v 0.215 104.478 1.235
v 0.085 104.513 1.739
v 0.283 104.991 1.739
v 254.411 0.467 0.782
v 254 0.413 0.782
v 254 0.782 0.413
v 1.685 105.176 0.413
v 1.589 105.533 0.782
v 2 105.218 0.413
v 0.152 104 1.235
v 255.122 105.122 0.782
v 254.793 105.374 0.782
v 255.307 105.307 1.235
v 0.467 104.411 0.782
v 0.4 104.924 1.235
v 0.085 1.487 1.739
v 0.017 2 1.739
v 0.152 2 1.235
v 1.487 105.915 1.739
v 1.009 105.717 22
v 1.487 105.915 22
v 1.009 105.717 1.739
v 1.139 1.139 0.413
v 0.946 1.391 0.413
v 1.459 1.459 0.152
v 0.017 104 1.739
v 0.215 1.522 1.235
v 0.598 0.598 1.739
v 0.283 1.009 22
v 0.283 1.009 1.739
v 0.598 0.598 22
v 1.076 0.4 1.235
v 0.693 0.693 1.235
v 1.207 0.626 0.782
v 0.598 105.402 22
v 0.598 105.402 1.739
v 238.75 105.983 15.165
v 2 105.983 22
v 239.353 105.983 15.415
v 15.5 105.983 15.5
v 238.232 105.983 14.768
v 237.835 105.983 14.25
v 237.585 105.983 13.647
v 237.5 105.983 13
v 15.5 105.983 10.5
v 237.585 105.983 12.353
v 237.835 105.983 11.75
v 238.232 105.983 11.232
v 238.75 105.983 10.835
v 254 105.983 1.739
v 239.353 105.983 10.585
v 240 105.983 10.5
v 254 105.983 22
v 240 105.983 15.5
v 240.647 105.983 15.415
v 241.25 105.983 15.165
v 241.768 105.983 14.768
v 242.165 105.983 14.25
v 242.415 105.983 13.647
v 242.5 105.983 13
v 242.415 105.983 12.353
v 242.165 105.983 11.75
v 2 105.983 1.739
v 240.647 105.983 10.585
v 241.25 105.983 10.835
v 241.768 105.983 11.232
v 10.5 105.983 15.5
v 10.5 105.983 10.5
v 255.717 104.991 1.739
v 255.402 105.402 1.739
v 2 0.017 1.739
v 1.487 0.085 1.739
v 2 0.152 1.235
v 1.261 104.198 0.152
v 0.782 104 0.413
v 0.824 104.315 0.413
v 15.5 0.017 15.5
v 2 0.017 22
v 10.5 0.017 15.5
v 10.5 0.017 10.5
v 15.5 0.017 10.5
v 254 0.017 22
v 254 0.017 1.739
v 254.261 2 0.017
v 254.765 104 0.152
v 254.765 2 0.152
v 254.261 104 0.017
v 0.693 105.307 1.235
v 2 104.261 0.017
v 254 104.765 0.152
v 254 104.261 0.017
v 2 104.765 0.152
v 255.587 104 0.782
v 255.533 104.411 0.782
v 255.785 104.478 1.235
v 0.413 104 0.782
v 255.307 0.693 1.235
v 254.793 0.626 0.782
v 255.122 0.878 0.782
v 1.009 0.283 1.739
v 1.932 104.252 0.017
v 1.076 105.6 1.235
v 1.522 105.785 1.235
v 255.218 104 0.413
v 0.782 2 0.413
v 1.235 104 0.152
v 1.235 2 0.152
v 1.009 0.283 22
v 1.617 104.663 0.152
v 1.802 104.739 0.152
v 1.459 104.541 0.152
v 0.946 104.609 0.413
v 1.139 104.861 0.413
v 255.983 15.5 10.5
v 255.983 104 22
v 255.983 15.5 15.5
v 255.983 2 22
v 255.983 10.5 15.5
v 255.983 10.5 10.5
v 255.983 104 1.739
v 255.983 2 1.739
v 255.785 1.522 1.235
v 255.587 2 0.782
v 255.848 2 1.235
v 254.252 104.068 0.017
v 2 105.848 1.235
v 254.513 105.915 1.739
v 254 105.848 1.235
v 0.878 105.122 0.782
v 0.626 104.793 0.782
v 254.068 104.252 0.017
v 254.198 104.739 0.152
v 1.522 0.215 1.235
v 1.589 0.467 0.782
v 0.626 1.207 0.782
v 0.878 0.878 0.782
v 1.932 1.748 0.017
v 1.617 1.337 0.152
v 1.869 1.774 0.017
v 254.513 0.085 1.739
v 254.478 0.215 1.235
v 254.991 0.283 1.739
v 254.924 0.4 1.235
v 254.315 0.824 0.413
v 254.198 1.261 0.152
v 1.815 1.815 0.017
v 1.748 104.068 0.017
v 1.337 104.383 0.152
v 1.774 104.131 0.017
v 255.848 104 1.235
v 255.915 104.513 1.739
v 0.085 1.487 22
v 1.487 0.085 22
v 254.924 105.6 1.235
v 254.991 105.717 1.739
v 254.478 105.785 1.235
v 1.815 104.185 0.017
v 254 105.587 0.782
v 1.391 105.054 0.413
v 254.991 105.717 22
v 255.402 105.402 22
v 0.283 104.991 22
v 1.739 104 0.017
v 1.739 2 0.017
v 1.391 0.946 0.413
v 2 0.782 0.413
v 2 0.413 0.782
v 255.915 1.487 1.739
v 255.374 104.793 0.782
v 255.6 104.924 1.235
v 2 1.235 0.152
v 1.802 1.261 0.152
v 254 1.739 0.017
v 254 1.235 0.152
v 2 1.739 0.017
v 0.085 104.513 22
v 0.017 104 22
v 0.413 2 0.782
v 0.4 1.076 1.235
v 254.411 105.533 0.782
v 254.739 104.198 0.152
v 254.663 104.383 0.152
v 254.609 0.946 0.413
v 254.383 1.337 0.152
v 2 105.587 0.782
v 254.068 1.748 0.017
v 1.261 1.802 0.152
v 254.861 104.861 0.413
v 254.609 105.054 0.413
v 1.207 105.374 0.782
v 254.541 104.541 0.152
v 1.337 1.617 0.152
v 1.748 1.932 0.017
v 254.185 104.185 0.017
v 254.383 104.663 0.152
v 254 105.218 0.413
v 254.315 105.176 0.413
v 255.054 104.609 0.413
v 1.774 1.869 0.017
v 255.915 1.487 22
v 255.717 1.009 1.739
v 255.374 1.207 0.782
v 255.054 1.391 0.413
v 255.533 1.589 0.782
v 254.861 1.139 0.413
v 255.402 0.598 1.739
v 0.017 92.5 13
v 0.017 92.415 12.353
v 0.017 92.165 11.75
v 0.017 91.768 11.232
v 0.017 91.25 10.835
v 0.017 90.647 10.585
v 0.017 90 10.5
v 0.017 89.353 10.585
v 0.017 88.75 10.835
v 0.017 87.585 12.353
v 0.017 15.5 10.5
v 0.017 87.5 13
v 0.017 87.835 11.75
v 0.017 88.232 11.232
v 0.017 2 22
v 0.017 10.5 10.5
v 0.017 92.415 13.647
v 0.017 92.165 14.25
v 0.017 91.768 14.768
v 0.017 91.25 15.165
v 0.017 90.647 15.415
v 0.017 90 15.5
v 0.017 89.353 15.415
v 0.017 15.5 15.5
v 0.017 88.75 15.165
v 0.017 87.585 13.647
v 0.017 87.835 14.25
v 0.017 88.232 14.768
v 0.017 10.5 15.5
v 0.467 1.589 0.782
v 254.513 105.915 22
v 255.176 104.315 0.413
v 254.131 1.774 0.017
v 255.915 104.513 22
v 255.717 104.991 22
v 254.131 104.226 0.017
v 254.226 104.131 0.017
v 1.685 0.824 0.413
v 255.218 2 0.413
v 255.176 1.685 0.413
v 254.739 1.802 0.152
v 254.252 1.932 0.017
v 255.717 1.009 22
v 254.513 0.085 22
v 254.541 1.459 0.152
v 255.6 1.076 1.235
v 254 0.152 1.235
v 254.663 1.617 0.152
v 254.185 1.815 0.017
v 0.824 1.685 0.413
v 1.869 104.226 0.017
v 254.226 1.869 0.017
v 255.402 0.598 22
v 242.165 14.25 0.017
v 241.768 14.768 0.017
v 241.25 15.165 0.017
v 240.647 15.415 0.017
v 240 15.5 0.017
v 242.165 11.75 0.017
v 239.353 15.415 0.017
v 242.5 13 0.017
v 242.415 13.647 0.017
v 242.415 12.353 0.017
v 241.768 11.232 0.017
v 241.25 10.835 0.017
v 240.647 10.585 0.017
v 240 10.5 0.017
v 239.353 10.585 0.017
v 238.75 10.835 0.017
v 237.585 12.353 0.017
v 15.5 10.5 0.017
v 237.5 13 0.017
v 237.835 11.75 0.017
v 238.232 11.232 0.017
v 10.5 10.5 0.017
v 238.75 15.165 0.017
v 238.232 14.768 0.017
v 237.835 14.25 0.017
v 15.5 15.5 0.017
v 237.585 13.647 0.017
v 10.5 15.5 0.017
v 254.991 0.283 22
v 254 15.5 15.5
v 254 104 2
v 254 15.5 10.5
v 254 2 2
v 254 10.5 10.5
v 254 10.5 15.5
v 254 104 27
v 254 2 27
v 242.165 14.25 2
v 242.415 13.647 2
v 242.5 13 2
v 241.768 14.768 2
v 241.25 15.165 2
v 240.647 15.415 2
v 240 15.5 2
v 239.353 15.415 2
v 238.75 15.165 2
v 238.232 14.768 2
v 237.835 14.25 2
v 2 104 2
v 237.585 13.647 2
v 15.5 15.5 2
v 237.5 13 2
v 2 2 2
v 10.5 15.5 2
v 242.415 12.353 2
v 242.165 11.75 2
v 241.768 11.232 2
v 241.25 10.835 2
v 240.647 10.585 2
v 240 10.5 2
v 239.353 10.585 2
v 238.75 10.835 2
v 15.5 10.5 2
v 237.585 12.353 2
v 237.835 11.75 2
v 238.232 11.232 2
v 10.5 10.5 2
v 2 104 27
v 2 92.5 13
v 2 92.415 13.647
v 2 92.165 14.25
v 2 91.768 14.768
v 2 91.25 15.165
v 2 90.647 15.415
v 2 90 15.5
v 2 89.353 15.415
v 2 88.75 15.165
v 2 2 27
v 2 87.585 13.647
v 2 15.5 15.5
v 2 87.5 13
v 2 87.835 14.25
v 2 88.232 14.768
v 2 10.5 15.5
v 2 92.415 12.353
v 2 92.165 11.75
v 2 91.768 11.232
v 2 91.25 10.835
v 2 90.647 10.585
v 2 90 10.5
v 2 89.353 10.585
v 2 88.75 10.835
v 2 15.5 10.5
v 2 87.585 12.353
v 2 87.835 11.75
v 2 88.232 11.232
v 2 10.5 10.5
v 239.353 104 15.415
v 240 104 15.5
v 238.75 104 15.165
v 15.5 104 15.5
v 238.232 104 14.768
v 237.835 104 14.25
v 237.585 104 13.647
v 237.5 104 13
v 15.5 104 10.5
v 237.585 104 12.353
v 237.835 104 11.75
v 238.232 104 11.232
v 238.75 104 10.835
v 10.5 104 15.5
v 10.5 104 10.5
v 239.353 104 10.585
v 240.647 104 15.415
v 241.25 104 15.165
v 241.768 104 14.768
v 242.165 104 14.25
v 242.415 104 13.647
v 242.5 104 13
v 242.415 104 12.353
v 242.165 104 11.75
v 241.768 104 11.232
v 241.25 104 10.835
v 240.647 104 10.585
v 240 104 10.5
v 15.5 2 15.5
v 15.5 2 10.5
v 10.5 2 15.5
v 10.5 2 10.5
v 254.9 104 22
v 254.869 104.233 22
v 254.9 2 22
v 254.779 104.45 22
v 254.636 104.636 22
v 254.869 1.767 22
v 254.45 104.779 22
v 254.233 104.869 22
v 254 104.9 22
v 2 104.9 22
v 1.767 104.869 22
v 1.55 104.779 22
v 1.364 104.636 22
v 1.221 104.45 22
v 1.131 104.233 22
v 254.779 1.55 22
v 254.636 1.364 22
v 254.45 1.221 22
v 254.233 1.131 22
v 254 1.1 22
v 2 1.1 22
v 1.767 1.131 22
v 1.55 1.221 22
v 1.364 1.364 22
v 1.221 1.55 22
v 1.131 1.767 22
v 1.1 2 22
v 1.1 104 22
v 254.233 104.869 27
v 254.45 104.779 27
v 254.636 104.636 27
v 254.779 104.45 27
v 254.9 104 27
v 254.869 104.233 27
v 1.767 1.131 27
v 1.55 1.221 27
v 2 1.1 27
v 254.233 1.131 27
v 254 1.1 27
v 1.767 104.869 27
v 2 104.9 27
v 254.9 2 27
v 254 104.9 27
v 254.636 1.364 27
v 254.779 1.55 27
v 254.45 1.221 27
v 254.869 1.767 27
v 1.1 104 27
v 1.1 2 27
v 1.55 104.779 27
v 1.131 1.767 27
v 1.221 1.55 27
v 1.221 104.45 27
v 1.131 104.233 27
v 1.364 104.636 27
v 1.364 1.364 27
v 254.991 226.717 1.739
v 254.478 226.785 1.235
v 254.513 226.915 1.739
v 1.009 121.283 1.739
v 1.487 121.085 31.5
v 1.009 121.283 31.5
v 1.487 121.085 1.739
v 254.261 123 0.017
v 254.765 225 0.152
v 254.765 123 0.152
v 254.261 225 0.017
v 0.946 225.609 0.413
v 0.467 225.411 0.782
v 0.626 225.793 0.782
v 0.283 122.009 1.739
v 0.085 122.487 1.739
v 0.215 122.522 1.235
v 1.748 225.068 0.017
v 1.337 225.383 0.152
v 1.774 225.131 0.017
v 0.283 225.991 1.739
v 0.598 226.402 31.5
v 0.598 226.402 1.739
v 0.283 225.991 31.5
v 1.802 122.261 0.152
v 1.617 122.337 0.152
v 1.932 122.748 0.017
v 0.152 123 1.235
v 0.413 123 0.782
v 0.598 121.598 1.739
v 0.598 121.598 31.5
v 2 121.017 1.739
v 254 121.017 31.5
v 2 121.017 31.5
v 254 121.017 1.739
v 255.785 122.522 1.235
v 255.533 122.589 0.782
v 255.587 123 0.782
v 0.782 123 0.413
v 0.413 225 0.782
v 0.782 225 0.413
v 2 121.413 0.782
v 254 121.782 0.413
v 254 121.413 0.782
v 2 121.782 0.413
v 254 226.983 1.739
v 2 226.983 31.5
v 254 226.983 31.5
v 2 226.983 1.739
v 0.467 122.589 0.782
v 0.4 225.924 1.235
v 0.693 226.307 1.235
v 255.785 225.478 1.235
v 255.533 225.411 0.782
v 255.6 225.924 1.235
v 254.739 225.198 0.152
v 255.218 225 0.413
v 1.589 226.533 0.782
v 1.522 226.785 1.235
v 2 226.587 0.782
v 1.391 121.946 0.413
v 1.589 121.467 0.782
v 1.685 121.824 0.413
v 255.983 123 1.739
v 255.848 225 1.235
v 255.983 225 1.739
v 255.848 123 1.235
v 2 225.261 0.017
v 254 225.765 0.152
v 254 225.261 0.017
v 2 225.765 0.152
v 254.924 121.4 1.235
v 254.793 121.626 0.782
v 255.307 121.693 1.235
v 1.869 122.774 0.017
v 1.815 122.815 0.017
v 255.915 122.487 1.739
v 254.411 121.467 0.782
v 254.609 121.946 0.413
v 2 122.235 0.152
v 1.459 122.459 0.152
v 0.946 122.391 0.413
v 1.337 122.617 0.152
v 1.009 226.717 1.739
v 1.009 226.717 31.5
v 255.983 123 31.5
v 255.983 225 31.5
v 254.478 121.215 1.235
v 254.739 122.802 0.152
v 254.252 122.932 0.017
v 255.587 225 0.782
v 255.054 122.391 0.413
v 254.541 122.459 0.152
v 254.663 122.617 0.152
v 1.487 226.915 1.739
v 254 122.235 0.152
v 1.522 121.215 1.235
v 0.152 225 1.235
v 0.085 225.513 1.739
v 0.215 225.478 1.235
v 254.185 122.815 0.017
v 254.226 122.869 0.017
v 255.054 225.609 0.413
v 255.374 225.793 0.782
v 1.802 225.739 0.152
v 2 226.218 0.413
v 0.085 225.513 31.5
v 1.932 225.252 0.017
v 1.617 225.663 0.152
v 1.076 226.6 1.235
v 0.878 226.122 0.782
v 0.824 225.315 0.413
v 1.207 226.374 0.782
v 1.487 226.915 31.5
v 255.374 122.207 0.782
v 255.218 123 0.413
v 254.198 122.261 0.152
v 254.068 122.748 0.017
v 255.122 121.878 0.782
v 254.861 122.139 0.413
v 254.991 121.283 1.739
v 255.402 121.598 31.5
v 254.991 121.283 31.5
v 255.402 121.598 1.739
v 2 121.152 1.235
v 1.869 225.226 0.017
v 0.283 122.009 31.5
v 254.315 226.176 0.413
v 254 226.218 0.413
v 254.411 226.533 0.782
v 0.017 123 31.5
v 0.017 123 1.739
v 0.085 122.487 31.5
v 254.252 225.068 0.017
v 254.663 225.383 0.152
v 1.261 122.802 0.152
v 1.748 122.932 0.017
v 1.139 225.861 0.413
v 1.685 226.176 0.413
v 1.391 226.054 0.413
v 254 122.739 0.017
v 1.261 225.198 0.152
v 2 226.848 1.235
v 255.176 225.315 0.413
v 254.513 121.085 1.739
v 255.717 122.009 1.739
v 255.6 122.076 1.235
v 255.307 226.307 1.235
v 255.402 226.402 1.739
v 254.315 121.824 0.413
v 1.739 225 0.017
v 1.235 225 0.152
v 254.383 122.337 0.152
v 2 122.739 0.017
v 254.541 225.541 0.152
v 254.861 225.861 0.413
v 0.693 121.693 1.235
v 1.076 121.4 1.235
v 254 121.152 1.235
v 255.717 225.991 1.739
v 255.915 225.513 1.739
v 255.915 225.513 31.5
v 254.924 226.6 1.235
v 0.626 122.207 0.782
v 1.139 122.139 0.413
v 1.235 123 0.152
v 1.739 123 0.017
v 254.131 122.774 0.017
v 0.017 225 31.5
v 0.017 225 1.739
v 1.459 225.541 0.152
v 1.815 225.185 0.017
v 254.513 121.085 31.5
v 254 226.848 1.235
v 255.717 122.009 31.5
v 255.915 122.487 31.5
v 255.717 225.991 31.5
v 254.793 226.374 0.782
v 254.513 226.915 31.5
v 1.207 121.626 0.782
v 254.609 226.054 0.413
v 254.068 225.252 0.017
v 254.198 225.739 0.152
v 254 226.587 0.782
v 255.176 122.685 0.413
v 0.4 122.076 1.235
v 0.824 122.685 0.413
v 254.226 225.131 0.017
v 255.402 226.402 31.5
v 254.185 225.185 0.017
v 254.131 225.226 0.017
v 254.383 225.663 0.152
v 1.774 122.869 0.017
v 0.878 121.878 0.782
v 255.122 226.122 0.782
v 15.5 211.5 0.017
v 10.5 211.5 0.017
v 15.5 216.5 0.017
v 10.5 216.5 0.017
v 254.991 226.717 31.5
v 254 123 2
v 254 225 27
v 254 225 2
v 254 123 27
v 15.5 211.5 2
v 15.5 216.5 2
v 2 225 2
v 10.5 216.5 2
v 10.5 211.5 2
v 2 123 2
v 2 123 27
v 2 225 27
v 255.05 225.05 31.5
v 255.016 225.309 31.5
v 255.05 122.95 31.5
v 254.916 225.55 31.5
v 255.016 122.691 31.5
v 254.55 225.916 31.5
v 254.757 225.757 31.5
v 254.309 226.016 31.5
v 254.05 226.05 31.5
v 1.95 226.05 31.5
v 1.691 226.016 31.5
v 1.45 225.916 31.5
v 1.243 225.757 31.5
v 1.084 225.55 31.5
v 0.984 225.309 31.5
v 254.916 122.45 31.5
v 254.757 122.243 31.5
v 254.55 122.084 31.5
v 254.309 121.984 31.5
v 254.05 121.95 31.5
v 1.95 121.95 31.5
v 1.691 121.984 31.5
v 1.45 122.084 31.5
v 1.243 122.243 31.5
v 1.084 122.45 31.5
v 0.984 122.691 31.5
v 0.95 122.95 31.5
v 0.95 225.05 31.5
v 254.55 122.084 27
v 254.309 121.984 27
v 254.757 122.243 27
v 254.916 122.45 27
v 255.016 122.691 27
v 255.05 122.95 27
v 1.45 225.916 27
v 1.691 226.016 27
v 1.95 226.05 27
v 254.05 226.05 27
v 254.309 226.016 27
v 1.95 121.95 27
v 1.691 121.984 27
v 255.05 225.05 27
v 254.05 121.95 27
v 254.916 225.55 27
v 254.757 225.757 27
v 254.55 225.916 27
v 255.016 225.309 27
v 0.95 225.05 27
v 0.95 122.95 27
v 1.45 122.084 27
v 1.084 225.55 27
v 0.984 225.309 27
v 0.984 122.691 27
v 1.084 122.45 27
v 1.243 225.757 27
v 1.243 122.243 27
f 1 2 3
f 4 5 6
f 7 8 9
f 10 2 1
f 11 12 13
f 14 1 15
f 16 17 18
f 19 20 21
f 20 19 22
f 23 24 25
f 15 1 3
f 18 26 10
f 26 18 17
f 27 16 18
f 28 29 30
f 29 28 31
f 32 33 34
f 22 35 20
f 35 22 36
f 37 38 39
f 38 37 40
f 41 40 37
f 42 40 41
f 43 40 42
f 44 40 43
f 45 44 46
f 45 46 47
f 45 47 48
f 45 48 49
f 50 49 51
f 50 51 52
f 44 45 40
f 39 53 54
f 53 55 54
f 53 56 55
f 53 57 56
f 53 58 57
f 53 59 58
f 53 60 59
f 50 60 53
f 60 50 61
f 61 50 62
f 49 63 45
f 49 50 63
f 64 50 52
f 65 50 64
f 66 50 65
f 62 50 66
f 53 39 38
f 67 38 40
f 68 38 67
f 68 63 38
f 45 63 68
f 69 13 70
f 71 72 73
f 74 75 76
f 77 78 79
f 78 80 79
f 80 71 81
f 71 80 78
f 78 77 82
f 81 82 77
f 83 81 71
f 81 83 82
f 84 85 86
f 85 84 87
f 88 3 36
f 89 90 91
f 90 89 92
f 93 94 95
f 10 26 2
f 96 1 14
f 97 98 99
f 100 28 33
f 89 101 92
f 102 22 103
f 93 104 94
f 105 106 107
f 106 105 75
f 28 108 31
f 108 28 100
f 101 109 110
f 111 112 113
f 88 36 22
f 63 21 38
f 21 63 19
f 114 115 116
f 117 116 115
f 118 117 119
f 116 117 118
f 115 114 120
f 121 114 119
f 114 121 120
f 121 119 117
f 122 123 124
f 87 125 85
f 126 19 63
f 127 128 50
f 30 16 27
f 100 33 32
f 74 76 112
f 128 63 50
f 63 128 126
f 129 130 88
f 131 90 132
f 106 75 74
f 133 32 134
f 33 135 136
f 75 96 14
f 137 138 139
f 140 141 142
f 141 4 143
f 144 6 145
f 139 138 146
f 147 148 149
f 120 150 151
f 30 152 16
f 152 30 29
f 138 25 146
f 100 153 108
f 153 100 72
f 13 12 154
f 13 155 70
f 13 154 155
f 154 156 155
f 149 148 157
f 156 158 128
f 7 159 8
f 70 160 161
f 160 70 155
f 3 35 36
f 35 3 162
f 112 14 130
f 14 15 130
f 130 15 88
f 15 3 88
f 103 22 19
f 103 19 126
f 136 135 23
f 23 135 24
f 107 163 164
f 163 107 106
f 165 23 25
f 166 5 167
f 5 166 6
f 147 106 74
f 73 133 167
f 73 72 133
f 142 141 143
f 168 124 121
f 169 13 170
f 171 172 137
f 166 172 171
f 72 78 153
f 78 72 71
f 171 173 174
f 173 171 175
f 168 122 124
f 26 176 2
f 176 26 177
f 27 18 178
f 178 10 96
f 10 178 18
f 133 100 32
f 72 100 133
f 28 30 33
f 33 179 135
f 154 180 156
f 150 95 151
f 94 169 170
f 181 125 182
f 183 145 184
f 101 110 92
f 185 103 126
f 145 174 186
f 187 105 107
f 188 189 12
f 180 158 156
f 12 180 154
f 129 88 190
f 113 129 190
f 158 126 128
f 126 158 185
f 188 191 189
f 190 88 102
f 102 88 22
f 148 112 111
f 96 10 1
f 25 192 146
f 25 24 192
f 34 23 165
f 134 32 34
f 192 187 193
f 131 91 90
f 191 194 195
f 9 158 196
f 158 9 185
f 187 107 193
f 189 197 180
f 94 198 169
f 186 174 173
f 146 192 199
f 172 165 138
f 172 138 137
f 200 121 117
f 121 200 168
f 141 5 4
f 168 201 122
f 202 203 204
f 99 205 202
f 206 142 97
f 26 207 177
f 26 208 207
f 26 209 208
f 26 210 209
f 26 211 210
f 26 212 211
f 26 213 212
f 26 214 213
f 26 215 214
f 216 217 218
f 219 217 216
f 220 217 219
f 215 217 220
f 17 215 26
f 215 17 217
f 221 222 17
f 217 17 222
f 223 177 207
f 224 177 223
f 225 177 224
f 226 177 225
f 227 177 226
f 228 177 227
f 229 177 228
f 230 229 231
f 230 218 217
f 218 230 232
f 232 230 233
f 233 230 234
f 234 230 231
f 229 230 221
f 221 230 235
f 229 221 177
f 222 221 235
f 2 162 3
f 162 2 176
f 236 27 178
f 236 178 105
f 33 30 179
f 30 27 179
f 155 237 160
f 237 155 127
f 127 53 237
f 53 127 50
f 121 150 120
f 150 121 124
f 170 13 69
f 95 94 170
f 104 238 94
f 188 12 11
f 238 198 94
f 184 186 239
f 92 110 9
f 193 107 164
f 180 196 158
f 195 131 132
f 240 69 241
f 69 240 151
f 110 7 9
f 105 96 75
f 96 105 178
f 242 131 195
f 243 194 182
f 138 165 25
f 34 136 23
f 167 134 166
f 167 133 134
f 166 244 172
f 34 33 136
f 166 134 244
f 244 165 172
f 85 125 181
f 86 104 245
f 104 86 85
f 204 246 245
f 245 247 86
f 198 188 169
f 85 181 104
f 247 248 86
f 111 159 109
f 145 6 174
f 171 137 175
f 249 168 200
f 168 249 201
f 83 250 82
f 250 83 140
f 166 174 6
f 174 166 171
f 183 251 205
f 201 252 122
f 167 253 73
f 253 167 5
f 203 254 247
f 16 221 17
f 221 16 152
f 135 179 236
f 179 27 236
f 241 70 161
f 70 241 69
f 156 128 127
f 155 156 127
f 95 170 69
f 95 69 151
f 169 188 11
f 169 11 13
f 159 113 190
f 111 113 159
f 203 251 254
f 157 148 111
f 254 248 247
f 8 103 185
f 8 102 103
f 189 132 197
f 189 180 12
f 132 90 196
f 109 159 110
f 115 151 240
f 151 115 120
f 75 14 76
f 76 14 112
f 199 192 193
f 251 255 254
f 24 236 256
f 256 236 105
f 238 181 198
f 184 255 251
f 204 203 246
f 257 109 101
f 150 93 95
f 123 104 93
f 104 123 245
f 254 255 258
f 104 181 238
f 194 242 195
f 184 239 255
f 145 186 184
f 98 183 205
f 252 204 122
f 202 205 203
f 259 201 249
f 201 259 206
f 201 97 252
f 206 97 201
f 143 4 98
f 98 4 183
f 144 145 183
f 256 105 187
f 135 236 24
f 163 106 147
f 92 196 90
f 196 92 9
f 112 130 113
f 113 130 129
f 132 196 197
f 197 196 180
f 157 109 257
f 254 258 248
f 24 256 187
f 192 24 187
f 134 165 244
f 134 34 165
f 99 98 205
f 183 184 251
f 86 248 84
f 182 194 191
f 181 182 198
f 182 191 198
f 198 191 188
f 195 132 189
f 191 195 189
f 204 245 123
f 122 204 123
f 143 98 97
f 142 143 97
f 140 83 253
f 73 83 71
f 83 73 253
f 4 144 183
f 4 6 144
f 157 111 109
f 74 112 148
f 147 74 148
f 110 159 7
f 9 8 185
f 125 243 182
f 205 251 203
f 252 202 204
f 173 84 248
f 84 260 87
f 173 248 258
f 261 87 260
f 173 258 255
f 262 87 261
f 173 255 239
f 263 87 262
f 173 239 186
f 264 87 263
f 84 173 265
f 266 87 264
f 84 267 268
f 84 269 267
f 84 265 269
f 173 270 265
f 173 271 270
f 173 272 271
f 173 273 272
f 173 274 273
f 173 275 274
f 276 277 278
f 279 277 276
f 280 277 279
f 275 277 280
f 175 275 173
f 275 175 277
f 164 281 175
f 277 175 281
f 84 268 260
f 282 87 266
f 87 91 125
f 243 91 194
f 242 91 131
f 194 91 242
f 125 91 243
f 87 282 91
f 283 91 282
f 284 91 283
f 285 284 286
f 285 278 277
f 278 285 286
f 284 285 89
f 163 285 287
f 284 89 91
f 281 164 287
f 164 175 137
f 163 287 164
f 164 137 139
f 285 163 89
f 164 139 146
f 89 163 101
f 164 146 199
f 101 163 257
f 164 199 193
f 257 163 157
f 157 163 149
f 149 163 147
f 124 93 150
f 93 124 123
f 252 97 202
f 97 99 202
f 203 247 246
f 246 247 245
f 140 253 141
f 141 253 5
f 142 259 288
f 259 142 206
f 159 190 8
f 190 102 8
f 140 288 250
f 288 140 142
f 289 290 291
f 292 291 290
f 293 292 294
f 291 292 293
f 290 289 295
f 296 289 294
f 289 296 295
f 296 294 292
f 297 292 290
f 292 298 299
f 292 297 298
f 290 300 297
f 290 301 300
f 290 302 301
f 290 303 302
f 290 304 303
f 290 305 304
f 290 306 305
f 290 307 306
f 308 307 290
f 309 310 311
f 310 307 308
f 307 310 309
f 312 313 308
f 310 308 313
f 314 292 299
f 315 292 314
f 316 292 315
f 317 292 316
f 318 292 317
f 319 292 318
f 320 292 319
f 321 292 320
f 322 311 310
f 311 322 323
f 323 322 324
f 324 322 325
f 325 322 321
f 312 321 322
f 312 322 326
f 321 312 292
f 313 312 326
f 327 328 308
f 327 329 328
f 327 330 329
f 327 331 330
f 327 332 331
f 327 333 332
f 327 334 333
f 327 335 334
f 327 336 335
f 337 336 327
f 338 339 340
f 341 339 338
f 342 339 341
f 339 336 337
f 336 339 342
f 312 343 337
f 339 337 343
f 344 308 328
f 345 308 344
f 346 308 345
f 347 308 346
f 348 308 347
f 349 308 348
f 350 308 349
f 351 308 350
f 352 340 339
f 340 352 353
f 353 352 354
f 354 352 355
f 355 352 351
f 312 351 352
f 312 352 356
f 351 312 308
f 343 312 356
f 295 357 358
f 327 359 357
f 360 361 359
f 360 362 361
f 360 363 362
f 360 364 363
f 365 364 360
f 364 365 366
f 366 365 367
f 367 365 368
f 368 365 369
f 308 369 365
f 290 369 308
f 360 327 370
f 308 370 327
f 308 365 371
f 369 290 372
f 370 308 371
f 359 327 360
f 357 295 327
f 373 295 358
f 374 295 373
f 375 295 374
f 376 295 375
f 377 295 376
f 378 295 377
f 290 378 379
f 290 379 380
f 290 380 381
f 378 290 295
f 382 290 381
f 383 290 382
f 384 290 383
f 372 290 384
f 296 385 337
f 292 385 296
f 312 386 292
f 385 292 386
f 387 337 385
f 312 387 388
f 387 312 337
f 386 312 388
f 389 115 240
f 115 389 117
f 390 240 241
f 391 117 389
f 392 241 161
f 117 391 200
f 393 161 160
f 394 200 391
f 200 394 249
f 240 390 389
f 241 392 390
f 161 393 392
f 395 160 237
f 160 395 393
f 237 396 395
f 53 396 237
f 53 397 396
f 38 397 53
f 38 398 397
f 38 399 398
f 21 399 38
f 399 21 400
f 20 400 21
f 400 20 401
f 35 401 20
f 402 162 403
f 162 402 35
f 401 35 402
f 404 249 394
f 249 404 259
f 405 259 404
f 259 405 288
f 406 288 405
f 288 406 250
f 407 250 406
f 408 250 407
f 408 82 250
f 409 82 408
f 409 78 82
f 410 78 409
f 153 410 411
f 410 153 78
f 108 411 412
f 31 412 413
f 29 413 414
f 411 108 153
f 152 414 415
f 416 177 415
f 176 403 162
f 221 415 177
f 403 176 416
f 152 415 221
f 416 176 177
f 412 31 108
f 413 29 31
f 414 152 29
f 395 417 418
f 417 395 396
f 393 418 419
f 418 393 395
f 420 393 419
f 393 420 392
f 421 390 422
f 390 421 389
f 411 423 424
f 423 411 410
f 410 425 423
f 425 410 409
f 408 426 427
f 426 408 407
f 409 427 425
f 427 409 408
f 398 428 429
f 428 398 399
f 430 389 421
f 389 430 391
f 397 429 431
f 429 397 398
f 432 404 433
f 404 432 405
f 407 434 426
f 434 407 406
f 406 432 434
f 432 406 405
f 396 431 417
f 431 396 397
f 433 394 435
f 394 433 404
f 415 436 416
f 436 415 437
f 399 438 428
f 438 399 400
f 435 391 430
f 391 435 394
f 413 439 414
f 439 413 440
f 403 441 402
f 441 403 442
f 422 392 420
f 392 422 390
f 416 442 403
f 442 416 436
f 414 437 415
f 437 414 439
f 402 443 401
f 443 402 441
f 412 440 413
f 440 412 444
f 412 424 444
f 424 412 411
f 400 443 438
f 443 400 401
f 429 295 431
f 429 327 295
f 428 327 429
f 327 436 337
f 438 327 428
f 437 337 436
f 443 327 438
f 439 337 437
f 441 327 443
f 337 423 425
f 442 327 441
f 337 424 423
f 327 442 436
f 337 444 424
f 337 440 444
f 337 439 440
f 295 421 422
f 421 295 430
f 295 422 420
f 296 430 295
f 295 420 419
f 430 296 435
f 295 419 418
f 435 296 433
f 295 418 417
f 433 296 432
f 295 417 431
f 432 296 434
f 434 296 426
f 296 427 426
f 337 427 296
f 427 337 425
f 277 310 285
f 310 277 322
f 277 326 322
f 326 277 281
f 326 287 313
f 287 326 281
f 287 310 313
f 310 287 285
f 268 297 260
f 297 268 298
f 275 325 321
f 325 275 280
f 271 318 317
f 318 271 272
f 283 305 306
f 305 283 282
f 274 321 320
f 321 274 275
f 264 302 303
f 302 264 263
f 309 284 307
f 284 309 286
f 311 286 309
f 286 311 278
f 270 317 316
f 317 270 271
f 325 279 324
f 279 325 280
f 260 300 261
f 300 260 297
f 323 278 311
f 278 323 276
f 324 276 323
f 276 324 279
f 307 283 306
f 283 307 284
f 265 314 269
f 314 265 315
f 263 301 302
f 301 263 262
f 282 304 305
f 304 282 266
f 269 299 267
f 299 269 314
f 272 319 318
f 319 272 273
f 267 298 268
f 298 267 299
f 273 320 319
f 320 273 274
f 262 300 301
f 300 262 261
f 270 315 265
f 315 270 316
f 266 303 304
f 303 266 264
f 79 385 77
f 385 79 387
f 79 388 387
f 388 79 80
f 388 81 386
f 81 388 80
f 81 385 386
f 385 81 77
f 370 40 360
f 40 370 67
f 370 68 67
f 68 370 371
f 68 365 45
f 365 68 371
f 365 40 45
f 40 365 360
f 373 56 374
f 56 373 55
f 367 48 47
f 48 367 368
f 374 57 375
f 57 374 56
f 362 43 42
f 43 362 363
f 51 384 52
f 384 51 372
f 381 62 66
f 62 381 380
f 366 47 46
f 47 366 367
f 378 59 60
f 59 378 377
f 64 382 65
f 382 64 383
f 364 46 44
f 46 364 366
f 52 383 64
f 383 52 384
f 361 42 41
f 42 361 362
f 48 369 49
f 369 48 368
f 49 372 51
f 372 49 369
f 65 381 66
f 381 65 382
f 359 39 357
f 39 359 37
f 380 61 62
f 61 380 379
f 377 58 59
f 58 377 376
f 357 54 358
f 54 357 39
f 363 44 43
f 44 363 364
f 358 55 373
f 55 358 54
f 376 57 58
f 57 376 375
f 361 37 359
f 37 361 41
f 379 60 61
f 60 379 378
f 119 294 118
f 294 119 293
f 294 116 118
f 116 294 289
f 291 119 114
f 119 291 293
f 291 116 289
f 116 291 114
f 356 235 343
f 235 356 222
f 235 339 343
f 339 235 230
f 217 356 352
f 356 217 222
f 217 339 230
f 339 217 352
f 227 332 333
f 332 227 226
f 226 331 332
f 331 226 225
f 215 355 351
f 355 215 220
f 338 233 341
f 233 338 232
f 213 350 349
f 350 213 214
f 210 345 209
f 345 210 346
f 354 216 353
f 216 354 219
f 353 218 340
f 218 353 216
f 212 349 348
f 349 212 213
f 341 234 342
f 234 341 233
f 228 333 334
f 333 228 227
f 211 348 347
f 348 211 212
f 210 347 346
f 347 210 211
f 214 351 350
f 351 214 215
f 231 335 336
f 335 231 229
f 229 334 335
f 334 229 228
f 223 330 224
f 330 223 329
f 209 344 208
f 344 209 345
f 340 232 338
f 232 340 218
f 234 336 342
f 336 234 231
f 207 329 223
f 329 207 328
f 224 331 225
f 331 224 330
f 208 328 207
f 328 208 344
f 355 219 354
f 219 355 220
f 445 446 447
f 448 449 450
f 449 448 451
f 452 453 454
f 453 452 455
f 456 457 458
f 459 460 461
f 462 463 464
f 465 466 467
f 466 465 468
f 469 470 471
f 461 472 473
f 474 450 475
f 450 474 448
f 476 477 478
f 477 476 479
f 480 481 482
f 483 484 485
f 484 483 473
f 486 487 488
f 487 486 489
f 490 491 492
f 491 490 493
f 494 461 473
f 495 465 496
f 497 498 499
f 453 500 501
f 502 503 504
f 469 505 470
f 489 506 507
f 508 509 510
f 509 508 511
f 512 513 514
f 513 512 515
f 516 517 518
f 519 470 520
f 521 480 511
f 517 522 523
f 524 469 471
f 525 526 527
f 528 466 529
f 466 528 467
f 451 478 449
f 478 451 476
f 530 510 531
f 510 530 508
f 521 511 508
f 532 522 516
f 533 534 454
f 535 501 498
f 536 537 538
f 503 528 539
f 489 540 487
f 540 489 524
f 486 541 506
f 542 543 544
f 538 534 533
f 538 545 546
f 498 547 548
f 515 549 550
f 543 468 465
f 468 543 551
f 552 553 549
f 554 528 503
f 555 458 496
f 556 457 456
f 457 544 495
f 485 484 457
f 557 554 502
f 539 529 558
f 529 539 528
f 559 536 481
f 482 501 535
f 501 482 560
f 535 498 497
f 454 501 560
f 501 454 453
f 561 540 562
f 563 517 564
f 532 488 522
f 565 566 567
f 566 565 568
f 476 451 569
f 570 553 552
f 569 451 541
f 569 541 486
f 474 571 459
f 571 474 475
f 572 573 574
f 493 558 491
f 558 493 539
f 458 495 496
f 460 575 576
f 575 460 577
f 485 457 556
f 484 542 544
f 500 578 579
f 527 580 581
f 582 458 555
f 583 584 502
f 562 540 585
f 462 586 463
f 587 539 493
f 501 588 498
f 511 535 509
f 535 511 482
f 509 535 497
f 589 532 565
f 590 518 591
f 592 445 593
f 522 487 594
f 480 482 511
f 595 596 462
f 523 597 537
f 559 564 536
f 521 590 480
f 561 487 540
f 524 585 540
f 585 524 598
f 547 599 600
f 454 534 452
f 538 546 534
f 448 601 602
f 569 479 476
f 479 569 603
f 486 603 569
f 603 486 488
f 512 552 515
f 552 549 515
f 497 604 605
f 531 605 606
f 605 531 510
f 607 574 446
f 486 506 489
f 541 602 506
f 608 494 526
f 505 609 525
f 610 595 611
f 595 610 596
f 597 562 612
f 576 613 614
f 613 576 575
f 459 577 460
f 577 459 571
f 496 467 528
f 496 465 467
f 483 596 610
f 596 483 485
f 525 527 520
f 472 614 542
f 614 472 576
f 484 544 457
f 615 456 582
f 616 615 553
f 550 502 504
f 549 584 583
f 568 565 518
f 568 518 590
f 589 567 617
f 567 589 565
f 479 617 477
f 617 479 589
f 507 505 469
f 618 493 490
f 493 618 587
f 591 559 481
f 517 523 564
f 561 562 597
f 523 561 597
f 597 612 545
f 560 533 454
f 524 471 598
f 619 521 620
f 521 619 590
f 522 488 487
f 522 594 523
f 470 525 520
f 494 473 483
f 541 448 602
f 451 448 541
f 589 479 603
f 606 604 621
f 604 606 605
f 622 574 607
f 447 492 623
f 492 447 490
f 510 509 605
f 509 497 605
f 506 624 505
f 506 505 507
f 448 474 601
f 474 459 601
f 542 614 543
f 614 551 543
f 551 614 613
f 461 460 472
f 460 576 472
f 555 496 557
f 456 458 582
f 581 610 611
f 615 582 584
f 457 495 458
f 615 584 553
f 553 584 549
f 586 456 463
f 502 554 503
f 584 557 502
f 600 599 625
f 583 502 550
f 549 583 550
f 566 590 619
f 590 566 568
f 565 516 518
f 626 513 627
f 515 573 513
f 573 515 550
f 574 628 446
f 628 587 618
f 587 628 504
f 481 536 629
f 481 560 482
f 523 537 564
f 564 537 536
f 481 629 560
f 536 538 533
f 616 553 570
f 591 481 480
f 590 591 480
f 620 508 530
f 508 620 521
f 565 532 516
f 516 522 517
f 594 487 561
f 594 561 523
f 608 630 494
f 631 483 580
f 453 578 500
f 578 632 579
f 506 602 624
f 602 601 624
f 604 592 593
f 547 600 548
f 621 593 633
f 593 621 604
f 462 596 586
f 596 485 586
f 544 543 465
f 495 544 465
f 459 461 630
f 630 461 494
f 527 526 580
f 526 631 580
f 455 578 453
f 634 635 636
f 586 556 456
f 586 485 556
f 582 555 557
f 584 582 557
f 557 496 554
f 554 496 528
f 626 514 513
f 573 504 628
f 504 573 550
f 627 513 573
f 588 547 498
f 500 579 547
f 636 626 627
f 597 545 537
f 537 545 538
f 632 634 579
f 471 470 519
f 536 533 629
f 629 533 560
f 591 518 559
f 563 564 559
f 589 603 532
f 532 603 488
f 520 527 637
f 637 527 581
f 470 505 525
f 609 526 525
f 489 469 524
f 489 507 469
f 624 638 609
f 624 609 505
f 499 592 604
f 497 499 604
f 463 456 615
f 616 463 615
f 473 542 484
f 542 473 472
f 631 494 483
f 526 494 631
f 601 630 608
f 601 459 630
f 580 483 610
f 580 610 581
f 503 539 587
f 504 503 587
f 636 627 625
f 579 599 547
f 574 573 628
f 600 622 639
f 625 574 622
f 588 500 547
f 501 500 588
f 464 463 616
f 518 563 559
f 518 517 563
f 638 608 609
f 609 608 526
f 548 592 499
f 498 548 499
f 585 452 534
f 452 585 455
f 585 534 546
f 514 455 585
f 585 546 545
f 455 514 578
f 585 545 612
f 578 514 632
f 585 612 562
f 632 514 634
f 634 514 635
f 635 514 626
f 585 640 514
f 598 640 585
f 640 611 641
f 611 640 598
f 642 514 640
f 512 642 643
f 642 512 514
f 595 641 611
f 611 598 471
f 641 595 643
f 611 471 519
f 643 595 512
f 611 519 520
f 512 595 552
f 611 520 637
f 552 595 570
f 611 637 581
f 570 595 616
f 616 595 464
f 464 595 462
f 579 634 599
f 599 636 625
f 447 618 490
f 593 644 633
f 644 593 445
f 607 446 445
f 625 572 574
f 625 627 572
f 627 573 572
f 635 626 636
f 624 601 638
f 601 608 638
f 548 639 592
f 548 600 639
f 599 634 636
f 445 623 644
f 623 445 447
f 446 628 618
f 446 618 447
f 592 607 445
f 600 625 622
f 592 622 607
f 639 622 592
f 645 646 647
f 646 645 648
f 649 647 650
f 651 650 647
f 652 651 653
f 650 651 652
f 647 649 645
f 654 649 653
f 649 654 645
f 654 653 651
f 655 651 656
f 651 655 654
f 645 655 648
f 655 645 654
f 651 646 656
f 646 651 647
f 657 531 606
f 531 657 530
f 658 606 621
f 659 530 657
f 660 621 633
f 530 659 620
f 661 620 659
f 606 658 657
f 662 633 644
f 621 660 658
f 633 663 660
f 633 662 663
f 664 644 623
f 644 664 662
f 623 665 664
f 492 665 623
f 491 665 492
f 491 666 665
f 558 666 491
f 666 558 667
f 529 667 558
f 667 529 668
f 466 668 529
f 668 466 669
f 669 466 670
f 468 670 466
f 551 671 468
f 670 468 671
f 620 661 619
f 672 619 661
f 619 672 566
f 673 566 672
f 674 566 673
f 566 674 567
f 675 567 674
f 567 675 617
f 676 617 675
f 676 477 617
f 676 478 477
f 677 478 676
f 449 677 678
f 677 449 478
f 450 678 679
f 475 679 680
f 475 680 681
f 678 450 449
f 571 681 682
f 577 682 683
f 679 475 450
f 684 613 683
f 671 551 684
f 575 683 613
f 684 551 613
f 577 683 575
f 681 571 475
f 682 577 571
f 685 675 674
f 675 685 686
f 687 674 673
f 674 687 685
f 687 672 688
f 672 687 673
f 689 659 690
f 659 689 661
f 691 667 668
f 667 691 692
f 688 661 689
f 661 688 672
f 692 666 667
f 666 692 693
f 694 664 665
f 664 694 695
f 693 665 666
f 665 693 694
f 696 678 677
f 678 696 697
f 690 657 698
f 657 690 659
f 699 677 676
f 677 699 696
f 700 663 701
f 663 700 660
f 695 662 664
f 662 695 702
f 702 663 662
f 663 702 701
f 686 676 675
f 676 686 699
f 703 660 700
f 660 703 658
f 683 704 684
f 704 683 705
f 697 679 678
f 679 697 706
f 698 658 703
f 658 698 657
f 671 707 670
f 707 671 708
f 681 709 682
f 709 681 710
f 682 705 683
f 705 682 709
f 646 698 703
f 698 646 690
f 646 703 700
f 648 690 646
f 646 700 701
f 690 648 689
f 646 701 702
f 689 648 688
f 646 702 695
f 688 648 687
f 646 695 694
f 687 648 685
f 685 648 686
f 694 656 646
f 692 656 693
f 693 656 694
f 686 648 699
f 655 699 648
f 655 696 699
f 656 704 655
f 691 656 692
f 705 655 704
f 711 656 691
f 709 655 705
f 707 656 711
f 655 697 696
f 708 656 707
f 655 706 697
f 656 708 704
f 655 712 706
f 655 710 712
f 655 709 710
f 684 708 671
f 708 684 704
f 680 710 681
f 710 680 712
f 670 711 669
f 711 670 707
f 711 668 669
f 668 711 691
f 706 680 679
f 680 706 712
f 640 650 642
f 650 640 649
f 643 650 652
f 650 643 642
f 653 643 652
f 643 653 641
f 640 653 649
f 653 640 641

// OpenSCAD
//-----------------------------------------------------------------------
// Yet Another Parameterized Projectbox generator
//
//  This is a box for <template>
//
//  Version 3.0 (03-12-2023)
//
// This design is parameterized based on the size of a PCB.
//
//  You might need to adjust the number of elements:
//
//      Preferences->Advanced->Turn of rendering at 250000 elements
//                                                  ^^^^^^
//
//-----------------------------------------------------------------------

include <../YAPPgenerator_v3.scad>

// Note: length/lengte refers to X axis, 
//       width/breedte to Y, 
//       height/hoogte to Z

/*
            padding-back>|<---- pcb length ---->|<padding-front
                                 RIGHT
                   0    X-ax ---> 
               +----------------------------------------+   ---
               |                                        |    ^
               |                                        |   padding-right 
             ^ |                                        |    v
             | |    -5,y +----------------------+       |   ---              
        B    Y |         | 0,y              x,y |       |     ^              F
        A    - |         |                      |       |     |              R
        C    a |         |                      |       |     | pcb width    O
        K    x |         |                      |       |     |              N
               |         | 0,0              x,0 |       |     v              T
               |   -5,0  +----------------------+       |   ---
               |                                        |    padding-left
             0 +----------------------------------------+   ---
               0    X-ax --->
                                 LEFT
*/


//-- which part(s) do you want to print?
printBaseShell        = true;
printLidShell         = true;
printSwitchExtenders  = false;

//-- pcb dimensions -- very important!!!
pcbLength           = 250; // Front to back
pcbWidth            = 100; // Side to side
pcbThickness        = 1.6;
                            
//-- padding between pcb and inside wall
paddingFront        = 1;
paddingBack         = 1;
paddingRight        = 1;
paddingLeft         = 1;

//-- Edit these parameters for your own box dimensions
wallThickness       = 2.0;
basePlaneThickness  = 2.0;
lidPlaneThickness   = 2.0;

//-- Total height of box = lidPlaneThickness 
//                       + lidWallHeight 
//--                     + baseWallHeight 
//                       + basePlaneThickness
//-- space between pcb and lidPlane :=
//--      (bottonWallHeight+lidWallHeight) - (standoffHeight+pcbThickness)
baseWallHeight      = 25;
lidWallHeight       = 25;

//-- ridge where base and lid off box can overlap
//-- Make sure this isn't less than lidWallHeight
ridgeHeight         = 5.0;
ridgeSlack          = 0.2;
roundRadius         = 2.0;

//-- How much the PCB needs to be raised from the base
//-- to leave room for solderings and whatnot
standoffHeight      = 1.0;  //-- used only for pushButton and showPCB
standoffPinDiameter = 2.4;
standoffHoleSlack   = 0.4;
standoffDiameter    = 8;



//-- C O N T R O L -------------//-> Default ---------
showSideBySide      = false;     //-> true
previewQuality      = 5;        //-> from 1 to 32, Default = 5
renderQuality       = 6;        //-> from 1 to 32, Default = 8
onLidGap            = 2;
shiftLid            = 5;
colorLid            = "gray";   
alphaLid            = 1;//0.2;   
colorBase           = "gray";
alphaBase           = 1;//0.2;
hideLidWalls        = false;    //-> false
hideBaseWalls       = false;    //-> false
showOrientation     = true;
showPCB             = false;
showSwitches        = false;
showPCBmarkers      = false;
showShellZero       = false;
showCenterMarkers   = false;
inspectX            = 0;        //-> 0=none (>0 from Back)
inspectY            = 0;        //-> 0=none (>0 from Right)
inspectZ            = 0;        //-> 0=none (>0 from Bottom)
inspectXfromBack    = true;     // View from the inspection cut foreward
inspectYfromLeft    = true;     //-> View from the inspection cut to the right
inspectZfromTop     = false;    //-> View from the inspection cut down
//-- C O N T R O L ---------------------------------------

//===================================================================
//  *** Cutouts ***
//    There are 6 cutouts one for each surface:
//      cutoutsBase (Bottom), cutoutsLid (Top), cutoutsFront, cutoutsBack, cutoutsLeft, cutoutsRight
//-------------------------------------------------------------------
//  Default origin =  yappCoordPCB : pcb[0,0,0]
//
//                        Required                Not Used        Note
//----------------------+-----------------------+---------------+------------------------------------
//  yappRectangle       | width, length         | radius        |
//  yappCircle          | radius                | width, length |
//  yappRoundedRect     | width, length, radius |               |     
//  yappCircleWithFlats | width, radius         | length        | length=distance between flats
//  yappCircleWithKey   | width, length, radius |               | width = key width length=key depth
//  yappPolygon         | width, length         | radius        | yappPolygonDef object must be
//                      |                       |               | provided
//----------------------+-----------------------+---------------+------------------------------------
//
//  Parameters:
//   Required:
//    p(0) = from Back
//    p(1) = from Left
//    p(2) = width
//    p(3) = length
//    p(4) = radius
//    p(5) = shape : { yappRectangle | yappCircle | yappPolygon | yappRoundedRect 
//                    | yappCircleWithFlats | yappCircleWithKey }
//  Optional:
//    p(6) = depth : Default = 0/Auto : 0 = Auto (plane thickness)
//    p(7) = angle : Default = 0
//    n(a) = { yappPolygonDef } : Required if shape = yappPolygon specified -
//    n(b) = { yappMaskDef } : If a yappMaskDef object is added it will be used as a mask 
//                             for the cutout.
//    n(c) = { [yappMaskDef, hOffset, vOffset, rotation] } : If a list for a mask is added 
//                              it will be used as a mask for the cutout. With the Rotation 
//                              and offsets applied. This can be used to fine tune the mask
//                              placement within the opening.
//    n(d) = { <yappCoordPCB> | yappCoordBox | yappCoordBoxInside }
//    n(e) = { <yappOrigin>, yappCenter }
//    n(f) = { <yappGlobalOrigin>, yappAltOrigin } // Only affects Bottom(base), Back and Right Faces
//    n(g) = [yappPCBName, "XXX"] : Specify a PCB. Defaults to [yappPCBName, "Main"]
//    n(h) = { yappFromInside } Make the cut from the inside towards the outside
//-------------------------------------------------------------------

cutoutsBase = 
[
  [10,10,5,5,undef,yappRectangle,yappCenter] 
 ,[10,10,undef,undef,2.5,yappCircle,yappCenter, yappAltOrigin] 
];

cutoutsLid  = 
[
  [10,10,5,5,undef,yappRectangle,yappCenter] 
 ,[10,10,undef,undef,2.5,yappCircle,yappCenter, yappAltOrigin] 

/*
 [25, 40, 20, 20, undef, yappRectangle, 0.2, yappCenter, maskHoneycomb]
 ,[50, 40, 20, 20, undef, yappRectangle, 0.2, yappCenter, maskHexCircles]
 ,[75, 40, 20, 20, undef, yappRectangle, 0.2, yappCenter, maskCircles]
 ,[100, 40, 20, 20, undef, yappRectangle, 0.2, yappCenter, maskBars]
 ,[125, 40, 20, 20, undef, yappRectangle, 0.2, yappCenter, maskOffsetBars]
 ,[150, 40, 20, 20, undef, yappRectangle, 0.2, yappCenter, maskSquares]
// ,[175, 40, 20, 20, undef, yappRectangle, 0.2, yappCenter]                    //(A)
*/
];

cutoutsFront = 
[
  [10,10,5,5,undef,yappRectangle,yappCenter] 
 ,[10,10,undef,undef,2.5,yappCircle,yappCenter, yappAltOrigin] 
];  


cutoutsBack = 
[
  [10,10,5,5,undef,yappRectangle,yappCenter] 
 ,[10,10,undef,undef,2.5,yappCircle,yappCenter, yappAltOrigin] 
];


cutoutsLeft = 
[
  [10,10,5,5,undef,yappRectangle,yappCenter] 
 ,[10,10,undef,undef,2.5,yappCircle,yappCenter, yappAltOrigin] 
];

cutoutsRight = 
[
  [10,10,5,5,undef,yappRectangle,yappCenter] 
 ,[10,10,undef,undef,2.5,yappCircle,yappCenter, yappAltOrigin] 
];


//===================================================================
//  *** Box Mounts ***
//  Mounting tabs on the outside of the box
//-------------------------------------------------------------------
//  Default origin = yappCoordBox: box[0,0,0]
//
//  Parameters:
//   Required:
//    p(0) = pos : position along the wall : [pos,offset] : vector for position and offset X.
//                    Position is to center of mounting screw in leftmost position in slot
//    p(1) = screwDiameter
//    p(2) = width of opening in addition to screw diameter 
//                    (0=Circular hole screwWidth = hole twice as wide as it is tall)
//    p(3) = height
//   Optional:
//    p(4) = filletRadius : Default = 0/Auto(0 = auto size)
//    n(a) = { yappLeft | yappRight | yappFront | yappBack } : one or more
//    n(b) = { yappNoFillet }
//    n(c) = { <yappBase>, yappLid }
//    n(d) = { yappCenter } : shifts Position to be in the center of the opening instead of 
//                            the left of the opening
//    n(e) = { <yappGlobalOrigin>, yappAltOrigin } : Only affects Back and Right Faces
//-------------------------------------------------------------------
boxMounts =
[
//  [20, 6, 6, 3, yappLeft]
];




//---- This is where the magic happens ----
YAPPgenerate();
